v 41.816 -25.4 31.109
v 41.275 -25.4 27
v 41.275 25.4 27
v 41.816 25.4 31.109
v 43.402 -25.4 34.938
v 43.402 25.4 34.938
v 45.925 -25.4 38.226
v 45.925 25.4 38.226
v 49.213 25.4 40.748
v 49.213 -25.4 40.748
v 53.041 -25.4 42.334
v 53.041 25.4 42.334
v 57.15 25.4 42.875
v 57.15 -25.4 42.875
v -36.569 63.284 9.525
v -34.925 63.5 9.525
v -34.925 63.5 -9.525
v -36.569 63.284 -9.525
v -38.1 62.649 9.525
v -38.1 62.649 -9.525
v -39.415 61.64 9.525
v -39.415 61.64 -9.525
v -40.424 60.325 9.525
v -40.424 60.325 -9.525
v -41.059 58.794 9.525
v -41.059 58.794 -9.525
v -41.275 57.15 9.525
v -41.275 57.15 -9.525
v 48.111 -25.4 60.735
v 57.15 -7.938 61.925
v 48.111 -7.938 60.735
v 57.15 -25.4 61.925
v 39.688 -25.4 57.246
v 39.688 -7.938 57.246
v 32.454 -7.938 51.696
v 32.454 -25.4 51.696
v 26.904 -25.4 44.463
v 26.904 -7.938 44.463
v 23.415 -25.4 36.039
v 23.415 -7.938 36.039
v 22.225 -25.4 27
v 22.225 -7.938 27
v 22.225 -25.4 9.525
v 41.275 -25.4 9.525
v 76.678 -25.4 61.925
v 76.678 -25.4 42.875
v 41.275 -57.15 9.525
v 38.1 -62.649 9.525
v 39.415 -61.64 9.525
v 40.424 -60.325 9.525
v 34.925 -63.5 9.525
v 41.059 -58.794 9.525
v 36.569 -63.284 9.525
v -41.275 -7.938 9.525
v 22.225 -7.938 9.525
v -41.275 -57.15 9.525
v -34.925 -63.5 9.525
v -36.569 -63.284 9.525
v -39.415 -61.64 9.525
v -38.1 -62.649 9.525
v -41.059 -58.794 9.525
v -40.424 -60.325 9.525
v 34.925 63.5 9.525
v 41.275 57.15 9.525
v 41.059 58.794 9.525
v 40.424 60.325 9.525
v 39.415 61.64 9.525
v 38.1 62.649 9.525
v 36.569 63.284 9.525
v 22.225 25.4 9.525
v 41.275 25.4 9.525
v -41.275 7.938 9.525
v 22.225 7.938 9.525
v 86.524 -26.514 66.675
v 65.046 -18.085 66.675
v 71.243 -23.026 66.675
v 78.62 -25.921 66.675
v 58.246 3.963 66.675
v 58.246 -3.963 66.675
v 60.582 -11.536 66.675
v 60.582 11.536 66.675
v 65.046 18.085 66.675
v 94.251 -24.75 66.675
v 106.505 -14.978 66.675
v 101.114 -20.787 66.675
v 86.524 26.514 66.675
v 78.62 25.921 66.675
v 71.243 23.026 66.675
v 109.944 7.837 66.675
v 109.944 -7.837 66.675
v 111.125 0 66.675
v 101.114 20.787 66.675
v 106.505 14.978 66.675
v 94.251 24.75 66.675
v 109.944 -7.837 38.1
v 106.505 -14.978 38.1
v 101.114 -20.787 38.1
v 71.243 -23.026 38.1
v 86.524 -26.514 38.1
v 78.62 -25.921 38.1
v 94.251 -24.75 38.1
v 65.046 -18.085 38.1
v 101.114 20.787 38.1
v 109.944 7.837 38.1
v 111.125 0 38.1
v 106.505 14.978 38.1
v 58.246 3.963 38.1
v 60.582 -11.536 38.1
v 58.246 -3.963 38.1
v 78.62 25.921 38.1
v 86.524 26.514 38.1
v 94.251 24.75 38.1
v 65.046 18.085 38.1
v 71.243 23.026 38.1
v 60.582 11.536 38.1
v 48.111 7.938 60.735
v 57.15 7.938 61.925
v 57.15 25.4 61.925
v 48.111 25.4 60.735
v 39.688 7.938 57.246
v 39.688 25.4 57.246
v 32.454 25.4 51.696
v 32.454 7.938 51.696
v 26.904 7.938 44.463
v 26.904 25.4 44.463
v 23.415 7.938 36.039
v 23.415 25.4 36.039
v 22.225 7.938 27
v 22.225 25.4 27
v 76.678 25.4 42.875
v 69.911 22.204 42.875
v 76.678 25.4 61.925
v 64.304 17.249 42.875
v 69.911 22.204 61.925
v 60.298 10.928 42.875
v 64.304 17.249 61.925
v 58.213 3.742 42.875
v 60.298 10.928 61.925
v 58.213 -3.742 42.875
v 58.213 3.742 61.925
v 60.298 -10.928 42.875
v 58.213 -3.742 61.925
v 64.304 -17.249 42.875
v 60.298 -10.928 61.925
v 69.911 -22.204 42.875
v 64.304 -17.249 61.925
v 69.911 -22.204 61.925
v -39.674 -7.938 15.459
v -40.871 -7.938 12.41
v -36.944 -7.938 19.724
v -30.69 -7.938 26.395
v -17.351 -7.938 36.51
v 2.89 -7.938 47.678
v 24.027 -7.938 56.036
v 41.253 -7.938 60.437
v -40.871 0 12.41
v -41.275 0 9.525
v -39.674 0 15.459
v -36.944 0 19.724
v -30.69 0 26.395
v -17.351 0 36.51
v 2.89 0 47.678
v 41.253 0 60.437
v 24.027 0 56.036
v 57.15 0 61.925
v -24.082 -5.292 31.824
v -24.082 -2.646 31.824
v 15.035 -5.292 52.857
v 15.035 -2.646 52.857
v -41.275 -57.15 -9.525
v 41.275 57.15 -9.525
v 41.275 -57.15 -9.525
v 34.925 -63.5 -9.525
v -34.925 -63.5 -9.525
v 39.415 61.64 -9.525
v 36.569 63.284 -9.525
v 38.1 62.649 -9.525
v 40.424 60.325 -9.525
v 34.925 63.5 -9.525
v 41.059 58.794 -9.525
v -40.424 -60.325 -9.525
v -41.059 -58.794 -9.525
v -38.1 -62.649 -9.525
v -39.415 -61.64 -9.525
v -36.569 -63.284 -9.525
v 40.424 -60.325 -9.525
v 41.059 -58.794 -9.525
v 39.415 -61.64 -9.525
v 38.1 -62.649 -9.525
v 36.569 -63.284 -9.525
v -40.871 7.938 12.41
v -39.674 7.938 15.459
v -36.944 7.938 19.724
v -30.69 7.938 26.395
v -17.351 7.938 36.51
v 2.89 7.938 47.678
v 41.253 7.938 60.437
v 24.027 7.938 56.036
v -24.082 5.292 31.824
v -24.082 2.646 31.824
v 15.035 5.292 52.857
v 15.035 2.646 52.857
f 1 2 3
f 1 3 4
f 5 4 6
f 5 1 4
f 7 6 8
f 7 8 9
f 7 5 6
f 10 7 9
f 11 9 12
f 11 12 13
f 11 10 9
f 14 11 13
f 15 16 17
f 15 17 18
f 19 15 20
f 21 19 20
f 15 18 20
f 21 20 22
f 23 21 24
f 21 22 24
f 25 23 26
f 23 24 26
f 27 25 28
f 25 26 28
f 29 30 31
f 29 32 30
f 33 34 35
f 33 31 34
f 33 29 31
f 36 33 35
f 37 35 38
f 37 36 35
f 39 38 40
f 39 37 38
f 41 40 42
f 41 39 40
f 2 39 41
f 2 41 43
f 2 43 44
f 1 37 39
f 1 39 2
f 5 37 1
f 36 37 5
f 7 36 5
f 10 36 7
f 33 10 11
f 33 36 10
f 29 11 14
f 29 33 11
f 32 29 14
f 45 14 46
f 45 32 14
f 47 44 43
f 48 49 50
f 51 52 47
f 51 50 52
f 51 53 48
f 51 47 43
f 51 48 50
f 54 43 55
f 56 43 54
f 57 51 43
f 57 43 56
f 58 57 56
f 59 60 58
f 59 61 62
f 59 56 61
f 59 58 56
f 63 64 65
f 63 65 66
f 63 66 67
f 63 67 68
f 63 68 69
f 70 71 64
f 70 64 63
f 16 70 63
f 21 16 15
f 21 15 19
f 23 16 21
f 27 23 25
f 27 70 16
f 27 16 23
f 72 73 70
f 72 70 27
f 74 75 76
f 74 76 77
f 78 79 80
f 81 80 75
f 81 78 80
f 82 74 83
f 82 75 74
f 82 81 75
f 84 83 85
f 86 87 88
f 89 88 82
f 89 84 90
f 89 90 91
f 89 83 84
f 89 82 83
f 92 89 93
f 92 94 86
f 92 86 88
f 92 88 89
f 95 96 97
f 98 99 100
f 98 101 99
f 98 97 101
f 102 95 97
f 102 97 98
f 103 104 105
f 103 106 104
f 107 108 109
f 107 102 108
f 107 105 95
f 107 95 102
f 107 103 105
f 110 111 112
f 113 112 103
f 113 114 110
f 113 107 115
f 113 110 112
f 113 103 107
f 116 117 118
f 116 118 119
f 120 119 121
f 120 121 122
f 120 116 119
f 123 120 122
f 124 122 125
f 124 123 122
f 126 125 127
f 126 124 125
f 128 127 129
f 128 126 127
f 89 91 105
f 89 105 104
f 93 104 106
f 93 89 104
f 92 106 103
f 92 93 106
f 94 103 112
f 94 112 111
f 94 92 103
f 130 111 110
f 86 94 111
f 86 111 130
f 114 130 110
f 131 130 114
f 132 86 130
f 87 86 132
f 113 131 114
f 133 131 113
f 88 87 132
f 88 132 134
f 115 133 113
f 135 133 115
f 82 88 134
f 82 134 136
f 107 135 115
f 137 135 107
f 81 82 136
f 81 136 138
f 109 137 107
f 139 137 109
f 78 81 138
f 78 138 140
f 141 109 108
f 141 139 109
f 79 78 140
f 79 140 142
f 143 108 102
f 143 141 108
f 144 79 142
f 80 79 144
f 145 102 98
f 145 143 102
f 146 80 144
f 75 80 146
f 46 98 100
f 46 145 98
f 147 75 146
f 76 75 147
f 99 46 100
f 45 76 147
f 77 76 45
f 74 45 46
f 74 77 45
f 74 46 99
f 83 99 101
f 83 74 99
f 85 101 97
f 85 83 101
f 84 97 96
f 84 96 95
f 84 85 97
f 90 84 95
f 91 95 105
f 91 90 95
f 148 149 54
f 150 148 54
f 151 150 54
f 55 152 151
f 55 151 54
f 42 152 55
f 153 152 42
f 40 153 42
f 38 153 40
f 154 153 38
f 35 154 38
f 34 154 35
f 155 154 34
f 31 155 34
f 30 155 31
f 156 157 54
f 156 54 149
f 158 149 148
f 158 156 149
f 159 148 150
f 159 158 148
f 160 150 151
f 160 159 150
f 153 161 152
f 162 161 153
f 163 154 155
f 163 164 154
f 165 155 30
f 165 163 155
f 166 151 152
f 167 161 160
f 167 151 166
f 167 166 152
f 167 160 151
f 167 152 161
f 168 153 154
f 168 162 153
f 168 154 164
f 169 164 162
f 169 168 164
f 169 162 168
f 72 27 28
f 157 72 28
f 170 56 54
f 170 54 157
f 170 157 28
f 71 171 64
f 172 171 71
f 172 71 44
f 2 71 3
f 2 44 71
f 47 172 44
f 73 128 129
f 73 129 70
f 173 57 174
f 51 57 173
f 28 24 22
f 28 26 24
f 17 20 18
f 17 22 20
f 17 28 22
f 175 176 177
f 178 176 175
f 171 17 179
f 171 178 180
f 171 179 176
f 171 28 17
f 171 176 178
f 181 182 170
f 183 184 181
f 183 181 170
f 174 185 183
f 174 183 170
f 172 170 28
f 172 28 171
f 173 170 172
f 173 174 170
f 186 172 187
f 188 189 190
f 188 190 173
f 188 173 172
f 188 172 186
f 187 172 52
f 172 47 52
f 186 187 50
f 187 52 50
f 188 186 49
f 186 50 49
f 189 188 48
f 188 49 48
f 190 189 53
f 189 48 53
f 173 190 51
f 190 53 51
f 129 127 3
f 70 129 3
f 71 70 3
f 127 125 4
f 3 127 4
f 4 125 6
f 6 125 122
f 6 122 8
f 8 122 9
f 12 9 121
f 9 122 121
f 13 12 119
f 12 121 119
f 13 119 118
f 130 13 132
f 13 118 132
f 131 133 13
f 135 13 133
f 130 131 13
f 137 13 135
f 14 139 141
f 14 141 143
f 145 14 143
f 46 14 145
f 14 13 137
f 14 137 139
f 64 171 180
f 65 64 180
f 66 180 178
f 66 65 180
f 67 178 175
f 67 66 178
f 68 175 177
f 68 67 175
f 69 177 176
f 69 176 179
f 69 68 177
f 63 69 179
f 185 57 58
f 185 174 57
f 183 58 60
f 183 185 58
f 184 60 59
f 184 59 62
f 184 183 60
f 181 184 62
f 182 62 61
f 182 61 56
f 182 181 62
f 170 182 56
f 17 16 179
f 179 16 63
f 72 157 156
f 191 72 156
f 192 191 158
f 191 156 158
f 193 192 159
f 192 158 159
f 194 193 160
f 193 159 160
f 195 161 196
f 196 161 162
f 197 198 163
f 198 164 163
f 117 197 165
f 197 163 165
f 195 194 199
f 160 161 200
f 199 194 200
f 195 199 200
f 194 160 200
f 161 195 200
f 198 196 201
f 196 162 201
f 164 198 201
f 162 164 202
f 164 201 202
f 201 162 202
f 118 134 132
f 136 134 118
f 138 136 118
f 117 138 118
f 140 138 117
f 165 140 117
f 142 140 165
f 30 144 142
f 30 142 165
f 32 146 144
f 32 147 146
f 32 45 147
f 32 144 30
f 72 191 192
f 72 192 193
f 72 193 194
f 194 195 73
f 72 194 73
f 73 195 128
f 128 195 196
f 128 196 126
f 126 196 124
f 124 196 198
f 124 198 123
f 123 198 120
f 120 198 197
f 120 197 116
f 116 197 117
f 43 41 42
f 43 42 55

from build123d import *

# Parameters (mm, degrees)
F1_DEPTH = 63.5
F0_W     = 24.2118924779
F0_H     = 19.05
F2_DEPTH = 25.4
F3_DEPTH = 7.9375
F5_R     = 6.35


with BuildPart() as f1:
    # F0 (on Front) → F1 (new body, symmetric)
    with BuildSketch(Plane.XZ):
        Polygon((22.225, 9.525), (-41.275, 9.525), (-41.275, -9.525), (41.275, -9.525), (41.275, 9.525), align=None)
    extrude(amount=F1_DEPTH, both=True)

    # F0 (on Front) → F2 (join, symmetric)
    with BuildSketch(Plane.XZ):
        with BuildLine():
            Line((60.325, 42.8752), (60.325, 61.9252))
            Line((60.325, 61.9252), (57.15, 61.9252))
            ThreePointArc((57.15, 61.9252), (32.4542956671, 51.6959043329), (22.225, 27.0002))
            Line((22.225, 27.0002), (22.225, 9.525))
            Line((22.225, 9.525), (41.275, 9.525))
            Line((41.275, 9.525), (41.275, 27.0002))
            ThreePointArc((41.275, 27.0002), (45.9246798487, 38.2255201513), (57.15, 42.8752))
            Line((57.15, 42.8752), (60.325, 42.8752))
        make_face()
        with Locations((72.430946239, 52.4002)):
            Rectangle(F0_W, F0_H)
    extrude(amount=F2_DEPTH, both=True)

    # F0 (on Front) → F3 (join, symmetric)
    with BuildSketch(Plane.XZ):
        with BuildLine():
            ThreePointArc((22.225, 27.0002), (32.4542956671, 51.6959043329), (57.15, 61.9252))
            add(Edge.make_bspline(
                [(-41.275, 9.525), (-41.352327913, 28.8889557123), (19.8454335332, 62.4071657658), (57.15, 61.9252)],
                knots=[0, 0, 0, 0, 111.5045361635, 111.5045361635, 111.5045361635, 111.5045361635], degree=3))
            Line((-41.275, 9.525), (22.225, 9.525))
            Line((22.225, 9.525), (22.225, 27.0002))
        make_face()
    extrude(amount=F3_DEPTH, both=True)

    # F0 (on Front) → F4 (revolve)
    with BuildSketch(Plane.XZ):
        Polygon((111.125, 38.1), (111.125, 66.675), (84.5368924779, 66.675), (84.5368924779, 61.9252), (84.5368924779, 42.8752), (84.5368924779, 38.1), align=None)
    revolve(axis=Axis((84.5368924779, 0, 52.3875), (0, 0, 1)))

    # F5
    f5_edges = [f1.edges().sort_by_distance(p)[0] for p in [
        (-41.275, -63.5, 0),
        (41.275, -63.5, 0),
        (41.275, 63.5, 0),
        (-41.275, 63.5, 0),
    ]]
    fillet(f5_edges, radius=F5_R)


solid = f1.part
